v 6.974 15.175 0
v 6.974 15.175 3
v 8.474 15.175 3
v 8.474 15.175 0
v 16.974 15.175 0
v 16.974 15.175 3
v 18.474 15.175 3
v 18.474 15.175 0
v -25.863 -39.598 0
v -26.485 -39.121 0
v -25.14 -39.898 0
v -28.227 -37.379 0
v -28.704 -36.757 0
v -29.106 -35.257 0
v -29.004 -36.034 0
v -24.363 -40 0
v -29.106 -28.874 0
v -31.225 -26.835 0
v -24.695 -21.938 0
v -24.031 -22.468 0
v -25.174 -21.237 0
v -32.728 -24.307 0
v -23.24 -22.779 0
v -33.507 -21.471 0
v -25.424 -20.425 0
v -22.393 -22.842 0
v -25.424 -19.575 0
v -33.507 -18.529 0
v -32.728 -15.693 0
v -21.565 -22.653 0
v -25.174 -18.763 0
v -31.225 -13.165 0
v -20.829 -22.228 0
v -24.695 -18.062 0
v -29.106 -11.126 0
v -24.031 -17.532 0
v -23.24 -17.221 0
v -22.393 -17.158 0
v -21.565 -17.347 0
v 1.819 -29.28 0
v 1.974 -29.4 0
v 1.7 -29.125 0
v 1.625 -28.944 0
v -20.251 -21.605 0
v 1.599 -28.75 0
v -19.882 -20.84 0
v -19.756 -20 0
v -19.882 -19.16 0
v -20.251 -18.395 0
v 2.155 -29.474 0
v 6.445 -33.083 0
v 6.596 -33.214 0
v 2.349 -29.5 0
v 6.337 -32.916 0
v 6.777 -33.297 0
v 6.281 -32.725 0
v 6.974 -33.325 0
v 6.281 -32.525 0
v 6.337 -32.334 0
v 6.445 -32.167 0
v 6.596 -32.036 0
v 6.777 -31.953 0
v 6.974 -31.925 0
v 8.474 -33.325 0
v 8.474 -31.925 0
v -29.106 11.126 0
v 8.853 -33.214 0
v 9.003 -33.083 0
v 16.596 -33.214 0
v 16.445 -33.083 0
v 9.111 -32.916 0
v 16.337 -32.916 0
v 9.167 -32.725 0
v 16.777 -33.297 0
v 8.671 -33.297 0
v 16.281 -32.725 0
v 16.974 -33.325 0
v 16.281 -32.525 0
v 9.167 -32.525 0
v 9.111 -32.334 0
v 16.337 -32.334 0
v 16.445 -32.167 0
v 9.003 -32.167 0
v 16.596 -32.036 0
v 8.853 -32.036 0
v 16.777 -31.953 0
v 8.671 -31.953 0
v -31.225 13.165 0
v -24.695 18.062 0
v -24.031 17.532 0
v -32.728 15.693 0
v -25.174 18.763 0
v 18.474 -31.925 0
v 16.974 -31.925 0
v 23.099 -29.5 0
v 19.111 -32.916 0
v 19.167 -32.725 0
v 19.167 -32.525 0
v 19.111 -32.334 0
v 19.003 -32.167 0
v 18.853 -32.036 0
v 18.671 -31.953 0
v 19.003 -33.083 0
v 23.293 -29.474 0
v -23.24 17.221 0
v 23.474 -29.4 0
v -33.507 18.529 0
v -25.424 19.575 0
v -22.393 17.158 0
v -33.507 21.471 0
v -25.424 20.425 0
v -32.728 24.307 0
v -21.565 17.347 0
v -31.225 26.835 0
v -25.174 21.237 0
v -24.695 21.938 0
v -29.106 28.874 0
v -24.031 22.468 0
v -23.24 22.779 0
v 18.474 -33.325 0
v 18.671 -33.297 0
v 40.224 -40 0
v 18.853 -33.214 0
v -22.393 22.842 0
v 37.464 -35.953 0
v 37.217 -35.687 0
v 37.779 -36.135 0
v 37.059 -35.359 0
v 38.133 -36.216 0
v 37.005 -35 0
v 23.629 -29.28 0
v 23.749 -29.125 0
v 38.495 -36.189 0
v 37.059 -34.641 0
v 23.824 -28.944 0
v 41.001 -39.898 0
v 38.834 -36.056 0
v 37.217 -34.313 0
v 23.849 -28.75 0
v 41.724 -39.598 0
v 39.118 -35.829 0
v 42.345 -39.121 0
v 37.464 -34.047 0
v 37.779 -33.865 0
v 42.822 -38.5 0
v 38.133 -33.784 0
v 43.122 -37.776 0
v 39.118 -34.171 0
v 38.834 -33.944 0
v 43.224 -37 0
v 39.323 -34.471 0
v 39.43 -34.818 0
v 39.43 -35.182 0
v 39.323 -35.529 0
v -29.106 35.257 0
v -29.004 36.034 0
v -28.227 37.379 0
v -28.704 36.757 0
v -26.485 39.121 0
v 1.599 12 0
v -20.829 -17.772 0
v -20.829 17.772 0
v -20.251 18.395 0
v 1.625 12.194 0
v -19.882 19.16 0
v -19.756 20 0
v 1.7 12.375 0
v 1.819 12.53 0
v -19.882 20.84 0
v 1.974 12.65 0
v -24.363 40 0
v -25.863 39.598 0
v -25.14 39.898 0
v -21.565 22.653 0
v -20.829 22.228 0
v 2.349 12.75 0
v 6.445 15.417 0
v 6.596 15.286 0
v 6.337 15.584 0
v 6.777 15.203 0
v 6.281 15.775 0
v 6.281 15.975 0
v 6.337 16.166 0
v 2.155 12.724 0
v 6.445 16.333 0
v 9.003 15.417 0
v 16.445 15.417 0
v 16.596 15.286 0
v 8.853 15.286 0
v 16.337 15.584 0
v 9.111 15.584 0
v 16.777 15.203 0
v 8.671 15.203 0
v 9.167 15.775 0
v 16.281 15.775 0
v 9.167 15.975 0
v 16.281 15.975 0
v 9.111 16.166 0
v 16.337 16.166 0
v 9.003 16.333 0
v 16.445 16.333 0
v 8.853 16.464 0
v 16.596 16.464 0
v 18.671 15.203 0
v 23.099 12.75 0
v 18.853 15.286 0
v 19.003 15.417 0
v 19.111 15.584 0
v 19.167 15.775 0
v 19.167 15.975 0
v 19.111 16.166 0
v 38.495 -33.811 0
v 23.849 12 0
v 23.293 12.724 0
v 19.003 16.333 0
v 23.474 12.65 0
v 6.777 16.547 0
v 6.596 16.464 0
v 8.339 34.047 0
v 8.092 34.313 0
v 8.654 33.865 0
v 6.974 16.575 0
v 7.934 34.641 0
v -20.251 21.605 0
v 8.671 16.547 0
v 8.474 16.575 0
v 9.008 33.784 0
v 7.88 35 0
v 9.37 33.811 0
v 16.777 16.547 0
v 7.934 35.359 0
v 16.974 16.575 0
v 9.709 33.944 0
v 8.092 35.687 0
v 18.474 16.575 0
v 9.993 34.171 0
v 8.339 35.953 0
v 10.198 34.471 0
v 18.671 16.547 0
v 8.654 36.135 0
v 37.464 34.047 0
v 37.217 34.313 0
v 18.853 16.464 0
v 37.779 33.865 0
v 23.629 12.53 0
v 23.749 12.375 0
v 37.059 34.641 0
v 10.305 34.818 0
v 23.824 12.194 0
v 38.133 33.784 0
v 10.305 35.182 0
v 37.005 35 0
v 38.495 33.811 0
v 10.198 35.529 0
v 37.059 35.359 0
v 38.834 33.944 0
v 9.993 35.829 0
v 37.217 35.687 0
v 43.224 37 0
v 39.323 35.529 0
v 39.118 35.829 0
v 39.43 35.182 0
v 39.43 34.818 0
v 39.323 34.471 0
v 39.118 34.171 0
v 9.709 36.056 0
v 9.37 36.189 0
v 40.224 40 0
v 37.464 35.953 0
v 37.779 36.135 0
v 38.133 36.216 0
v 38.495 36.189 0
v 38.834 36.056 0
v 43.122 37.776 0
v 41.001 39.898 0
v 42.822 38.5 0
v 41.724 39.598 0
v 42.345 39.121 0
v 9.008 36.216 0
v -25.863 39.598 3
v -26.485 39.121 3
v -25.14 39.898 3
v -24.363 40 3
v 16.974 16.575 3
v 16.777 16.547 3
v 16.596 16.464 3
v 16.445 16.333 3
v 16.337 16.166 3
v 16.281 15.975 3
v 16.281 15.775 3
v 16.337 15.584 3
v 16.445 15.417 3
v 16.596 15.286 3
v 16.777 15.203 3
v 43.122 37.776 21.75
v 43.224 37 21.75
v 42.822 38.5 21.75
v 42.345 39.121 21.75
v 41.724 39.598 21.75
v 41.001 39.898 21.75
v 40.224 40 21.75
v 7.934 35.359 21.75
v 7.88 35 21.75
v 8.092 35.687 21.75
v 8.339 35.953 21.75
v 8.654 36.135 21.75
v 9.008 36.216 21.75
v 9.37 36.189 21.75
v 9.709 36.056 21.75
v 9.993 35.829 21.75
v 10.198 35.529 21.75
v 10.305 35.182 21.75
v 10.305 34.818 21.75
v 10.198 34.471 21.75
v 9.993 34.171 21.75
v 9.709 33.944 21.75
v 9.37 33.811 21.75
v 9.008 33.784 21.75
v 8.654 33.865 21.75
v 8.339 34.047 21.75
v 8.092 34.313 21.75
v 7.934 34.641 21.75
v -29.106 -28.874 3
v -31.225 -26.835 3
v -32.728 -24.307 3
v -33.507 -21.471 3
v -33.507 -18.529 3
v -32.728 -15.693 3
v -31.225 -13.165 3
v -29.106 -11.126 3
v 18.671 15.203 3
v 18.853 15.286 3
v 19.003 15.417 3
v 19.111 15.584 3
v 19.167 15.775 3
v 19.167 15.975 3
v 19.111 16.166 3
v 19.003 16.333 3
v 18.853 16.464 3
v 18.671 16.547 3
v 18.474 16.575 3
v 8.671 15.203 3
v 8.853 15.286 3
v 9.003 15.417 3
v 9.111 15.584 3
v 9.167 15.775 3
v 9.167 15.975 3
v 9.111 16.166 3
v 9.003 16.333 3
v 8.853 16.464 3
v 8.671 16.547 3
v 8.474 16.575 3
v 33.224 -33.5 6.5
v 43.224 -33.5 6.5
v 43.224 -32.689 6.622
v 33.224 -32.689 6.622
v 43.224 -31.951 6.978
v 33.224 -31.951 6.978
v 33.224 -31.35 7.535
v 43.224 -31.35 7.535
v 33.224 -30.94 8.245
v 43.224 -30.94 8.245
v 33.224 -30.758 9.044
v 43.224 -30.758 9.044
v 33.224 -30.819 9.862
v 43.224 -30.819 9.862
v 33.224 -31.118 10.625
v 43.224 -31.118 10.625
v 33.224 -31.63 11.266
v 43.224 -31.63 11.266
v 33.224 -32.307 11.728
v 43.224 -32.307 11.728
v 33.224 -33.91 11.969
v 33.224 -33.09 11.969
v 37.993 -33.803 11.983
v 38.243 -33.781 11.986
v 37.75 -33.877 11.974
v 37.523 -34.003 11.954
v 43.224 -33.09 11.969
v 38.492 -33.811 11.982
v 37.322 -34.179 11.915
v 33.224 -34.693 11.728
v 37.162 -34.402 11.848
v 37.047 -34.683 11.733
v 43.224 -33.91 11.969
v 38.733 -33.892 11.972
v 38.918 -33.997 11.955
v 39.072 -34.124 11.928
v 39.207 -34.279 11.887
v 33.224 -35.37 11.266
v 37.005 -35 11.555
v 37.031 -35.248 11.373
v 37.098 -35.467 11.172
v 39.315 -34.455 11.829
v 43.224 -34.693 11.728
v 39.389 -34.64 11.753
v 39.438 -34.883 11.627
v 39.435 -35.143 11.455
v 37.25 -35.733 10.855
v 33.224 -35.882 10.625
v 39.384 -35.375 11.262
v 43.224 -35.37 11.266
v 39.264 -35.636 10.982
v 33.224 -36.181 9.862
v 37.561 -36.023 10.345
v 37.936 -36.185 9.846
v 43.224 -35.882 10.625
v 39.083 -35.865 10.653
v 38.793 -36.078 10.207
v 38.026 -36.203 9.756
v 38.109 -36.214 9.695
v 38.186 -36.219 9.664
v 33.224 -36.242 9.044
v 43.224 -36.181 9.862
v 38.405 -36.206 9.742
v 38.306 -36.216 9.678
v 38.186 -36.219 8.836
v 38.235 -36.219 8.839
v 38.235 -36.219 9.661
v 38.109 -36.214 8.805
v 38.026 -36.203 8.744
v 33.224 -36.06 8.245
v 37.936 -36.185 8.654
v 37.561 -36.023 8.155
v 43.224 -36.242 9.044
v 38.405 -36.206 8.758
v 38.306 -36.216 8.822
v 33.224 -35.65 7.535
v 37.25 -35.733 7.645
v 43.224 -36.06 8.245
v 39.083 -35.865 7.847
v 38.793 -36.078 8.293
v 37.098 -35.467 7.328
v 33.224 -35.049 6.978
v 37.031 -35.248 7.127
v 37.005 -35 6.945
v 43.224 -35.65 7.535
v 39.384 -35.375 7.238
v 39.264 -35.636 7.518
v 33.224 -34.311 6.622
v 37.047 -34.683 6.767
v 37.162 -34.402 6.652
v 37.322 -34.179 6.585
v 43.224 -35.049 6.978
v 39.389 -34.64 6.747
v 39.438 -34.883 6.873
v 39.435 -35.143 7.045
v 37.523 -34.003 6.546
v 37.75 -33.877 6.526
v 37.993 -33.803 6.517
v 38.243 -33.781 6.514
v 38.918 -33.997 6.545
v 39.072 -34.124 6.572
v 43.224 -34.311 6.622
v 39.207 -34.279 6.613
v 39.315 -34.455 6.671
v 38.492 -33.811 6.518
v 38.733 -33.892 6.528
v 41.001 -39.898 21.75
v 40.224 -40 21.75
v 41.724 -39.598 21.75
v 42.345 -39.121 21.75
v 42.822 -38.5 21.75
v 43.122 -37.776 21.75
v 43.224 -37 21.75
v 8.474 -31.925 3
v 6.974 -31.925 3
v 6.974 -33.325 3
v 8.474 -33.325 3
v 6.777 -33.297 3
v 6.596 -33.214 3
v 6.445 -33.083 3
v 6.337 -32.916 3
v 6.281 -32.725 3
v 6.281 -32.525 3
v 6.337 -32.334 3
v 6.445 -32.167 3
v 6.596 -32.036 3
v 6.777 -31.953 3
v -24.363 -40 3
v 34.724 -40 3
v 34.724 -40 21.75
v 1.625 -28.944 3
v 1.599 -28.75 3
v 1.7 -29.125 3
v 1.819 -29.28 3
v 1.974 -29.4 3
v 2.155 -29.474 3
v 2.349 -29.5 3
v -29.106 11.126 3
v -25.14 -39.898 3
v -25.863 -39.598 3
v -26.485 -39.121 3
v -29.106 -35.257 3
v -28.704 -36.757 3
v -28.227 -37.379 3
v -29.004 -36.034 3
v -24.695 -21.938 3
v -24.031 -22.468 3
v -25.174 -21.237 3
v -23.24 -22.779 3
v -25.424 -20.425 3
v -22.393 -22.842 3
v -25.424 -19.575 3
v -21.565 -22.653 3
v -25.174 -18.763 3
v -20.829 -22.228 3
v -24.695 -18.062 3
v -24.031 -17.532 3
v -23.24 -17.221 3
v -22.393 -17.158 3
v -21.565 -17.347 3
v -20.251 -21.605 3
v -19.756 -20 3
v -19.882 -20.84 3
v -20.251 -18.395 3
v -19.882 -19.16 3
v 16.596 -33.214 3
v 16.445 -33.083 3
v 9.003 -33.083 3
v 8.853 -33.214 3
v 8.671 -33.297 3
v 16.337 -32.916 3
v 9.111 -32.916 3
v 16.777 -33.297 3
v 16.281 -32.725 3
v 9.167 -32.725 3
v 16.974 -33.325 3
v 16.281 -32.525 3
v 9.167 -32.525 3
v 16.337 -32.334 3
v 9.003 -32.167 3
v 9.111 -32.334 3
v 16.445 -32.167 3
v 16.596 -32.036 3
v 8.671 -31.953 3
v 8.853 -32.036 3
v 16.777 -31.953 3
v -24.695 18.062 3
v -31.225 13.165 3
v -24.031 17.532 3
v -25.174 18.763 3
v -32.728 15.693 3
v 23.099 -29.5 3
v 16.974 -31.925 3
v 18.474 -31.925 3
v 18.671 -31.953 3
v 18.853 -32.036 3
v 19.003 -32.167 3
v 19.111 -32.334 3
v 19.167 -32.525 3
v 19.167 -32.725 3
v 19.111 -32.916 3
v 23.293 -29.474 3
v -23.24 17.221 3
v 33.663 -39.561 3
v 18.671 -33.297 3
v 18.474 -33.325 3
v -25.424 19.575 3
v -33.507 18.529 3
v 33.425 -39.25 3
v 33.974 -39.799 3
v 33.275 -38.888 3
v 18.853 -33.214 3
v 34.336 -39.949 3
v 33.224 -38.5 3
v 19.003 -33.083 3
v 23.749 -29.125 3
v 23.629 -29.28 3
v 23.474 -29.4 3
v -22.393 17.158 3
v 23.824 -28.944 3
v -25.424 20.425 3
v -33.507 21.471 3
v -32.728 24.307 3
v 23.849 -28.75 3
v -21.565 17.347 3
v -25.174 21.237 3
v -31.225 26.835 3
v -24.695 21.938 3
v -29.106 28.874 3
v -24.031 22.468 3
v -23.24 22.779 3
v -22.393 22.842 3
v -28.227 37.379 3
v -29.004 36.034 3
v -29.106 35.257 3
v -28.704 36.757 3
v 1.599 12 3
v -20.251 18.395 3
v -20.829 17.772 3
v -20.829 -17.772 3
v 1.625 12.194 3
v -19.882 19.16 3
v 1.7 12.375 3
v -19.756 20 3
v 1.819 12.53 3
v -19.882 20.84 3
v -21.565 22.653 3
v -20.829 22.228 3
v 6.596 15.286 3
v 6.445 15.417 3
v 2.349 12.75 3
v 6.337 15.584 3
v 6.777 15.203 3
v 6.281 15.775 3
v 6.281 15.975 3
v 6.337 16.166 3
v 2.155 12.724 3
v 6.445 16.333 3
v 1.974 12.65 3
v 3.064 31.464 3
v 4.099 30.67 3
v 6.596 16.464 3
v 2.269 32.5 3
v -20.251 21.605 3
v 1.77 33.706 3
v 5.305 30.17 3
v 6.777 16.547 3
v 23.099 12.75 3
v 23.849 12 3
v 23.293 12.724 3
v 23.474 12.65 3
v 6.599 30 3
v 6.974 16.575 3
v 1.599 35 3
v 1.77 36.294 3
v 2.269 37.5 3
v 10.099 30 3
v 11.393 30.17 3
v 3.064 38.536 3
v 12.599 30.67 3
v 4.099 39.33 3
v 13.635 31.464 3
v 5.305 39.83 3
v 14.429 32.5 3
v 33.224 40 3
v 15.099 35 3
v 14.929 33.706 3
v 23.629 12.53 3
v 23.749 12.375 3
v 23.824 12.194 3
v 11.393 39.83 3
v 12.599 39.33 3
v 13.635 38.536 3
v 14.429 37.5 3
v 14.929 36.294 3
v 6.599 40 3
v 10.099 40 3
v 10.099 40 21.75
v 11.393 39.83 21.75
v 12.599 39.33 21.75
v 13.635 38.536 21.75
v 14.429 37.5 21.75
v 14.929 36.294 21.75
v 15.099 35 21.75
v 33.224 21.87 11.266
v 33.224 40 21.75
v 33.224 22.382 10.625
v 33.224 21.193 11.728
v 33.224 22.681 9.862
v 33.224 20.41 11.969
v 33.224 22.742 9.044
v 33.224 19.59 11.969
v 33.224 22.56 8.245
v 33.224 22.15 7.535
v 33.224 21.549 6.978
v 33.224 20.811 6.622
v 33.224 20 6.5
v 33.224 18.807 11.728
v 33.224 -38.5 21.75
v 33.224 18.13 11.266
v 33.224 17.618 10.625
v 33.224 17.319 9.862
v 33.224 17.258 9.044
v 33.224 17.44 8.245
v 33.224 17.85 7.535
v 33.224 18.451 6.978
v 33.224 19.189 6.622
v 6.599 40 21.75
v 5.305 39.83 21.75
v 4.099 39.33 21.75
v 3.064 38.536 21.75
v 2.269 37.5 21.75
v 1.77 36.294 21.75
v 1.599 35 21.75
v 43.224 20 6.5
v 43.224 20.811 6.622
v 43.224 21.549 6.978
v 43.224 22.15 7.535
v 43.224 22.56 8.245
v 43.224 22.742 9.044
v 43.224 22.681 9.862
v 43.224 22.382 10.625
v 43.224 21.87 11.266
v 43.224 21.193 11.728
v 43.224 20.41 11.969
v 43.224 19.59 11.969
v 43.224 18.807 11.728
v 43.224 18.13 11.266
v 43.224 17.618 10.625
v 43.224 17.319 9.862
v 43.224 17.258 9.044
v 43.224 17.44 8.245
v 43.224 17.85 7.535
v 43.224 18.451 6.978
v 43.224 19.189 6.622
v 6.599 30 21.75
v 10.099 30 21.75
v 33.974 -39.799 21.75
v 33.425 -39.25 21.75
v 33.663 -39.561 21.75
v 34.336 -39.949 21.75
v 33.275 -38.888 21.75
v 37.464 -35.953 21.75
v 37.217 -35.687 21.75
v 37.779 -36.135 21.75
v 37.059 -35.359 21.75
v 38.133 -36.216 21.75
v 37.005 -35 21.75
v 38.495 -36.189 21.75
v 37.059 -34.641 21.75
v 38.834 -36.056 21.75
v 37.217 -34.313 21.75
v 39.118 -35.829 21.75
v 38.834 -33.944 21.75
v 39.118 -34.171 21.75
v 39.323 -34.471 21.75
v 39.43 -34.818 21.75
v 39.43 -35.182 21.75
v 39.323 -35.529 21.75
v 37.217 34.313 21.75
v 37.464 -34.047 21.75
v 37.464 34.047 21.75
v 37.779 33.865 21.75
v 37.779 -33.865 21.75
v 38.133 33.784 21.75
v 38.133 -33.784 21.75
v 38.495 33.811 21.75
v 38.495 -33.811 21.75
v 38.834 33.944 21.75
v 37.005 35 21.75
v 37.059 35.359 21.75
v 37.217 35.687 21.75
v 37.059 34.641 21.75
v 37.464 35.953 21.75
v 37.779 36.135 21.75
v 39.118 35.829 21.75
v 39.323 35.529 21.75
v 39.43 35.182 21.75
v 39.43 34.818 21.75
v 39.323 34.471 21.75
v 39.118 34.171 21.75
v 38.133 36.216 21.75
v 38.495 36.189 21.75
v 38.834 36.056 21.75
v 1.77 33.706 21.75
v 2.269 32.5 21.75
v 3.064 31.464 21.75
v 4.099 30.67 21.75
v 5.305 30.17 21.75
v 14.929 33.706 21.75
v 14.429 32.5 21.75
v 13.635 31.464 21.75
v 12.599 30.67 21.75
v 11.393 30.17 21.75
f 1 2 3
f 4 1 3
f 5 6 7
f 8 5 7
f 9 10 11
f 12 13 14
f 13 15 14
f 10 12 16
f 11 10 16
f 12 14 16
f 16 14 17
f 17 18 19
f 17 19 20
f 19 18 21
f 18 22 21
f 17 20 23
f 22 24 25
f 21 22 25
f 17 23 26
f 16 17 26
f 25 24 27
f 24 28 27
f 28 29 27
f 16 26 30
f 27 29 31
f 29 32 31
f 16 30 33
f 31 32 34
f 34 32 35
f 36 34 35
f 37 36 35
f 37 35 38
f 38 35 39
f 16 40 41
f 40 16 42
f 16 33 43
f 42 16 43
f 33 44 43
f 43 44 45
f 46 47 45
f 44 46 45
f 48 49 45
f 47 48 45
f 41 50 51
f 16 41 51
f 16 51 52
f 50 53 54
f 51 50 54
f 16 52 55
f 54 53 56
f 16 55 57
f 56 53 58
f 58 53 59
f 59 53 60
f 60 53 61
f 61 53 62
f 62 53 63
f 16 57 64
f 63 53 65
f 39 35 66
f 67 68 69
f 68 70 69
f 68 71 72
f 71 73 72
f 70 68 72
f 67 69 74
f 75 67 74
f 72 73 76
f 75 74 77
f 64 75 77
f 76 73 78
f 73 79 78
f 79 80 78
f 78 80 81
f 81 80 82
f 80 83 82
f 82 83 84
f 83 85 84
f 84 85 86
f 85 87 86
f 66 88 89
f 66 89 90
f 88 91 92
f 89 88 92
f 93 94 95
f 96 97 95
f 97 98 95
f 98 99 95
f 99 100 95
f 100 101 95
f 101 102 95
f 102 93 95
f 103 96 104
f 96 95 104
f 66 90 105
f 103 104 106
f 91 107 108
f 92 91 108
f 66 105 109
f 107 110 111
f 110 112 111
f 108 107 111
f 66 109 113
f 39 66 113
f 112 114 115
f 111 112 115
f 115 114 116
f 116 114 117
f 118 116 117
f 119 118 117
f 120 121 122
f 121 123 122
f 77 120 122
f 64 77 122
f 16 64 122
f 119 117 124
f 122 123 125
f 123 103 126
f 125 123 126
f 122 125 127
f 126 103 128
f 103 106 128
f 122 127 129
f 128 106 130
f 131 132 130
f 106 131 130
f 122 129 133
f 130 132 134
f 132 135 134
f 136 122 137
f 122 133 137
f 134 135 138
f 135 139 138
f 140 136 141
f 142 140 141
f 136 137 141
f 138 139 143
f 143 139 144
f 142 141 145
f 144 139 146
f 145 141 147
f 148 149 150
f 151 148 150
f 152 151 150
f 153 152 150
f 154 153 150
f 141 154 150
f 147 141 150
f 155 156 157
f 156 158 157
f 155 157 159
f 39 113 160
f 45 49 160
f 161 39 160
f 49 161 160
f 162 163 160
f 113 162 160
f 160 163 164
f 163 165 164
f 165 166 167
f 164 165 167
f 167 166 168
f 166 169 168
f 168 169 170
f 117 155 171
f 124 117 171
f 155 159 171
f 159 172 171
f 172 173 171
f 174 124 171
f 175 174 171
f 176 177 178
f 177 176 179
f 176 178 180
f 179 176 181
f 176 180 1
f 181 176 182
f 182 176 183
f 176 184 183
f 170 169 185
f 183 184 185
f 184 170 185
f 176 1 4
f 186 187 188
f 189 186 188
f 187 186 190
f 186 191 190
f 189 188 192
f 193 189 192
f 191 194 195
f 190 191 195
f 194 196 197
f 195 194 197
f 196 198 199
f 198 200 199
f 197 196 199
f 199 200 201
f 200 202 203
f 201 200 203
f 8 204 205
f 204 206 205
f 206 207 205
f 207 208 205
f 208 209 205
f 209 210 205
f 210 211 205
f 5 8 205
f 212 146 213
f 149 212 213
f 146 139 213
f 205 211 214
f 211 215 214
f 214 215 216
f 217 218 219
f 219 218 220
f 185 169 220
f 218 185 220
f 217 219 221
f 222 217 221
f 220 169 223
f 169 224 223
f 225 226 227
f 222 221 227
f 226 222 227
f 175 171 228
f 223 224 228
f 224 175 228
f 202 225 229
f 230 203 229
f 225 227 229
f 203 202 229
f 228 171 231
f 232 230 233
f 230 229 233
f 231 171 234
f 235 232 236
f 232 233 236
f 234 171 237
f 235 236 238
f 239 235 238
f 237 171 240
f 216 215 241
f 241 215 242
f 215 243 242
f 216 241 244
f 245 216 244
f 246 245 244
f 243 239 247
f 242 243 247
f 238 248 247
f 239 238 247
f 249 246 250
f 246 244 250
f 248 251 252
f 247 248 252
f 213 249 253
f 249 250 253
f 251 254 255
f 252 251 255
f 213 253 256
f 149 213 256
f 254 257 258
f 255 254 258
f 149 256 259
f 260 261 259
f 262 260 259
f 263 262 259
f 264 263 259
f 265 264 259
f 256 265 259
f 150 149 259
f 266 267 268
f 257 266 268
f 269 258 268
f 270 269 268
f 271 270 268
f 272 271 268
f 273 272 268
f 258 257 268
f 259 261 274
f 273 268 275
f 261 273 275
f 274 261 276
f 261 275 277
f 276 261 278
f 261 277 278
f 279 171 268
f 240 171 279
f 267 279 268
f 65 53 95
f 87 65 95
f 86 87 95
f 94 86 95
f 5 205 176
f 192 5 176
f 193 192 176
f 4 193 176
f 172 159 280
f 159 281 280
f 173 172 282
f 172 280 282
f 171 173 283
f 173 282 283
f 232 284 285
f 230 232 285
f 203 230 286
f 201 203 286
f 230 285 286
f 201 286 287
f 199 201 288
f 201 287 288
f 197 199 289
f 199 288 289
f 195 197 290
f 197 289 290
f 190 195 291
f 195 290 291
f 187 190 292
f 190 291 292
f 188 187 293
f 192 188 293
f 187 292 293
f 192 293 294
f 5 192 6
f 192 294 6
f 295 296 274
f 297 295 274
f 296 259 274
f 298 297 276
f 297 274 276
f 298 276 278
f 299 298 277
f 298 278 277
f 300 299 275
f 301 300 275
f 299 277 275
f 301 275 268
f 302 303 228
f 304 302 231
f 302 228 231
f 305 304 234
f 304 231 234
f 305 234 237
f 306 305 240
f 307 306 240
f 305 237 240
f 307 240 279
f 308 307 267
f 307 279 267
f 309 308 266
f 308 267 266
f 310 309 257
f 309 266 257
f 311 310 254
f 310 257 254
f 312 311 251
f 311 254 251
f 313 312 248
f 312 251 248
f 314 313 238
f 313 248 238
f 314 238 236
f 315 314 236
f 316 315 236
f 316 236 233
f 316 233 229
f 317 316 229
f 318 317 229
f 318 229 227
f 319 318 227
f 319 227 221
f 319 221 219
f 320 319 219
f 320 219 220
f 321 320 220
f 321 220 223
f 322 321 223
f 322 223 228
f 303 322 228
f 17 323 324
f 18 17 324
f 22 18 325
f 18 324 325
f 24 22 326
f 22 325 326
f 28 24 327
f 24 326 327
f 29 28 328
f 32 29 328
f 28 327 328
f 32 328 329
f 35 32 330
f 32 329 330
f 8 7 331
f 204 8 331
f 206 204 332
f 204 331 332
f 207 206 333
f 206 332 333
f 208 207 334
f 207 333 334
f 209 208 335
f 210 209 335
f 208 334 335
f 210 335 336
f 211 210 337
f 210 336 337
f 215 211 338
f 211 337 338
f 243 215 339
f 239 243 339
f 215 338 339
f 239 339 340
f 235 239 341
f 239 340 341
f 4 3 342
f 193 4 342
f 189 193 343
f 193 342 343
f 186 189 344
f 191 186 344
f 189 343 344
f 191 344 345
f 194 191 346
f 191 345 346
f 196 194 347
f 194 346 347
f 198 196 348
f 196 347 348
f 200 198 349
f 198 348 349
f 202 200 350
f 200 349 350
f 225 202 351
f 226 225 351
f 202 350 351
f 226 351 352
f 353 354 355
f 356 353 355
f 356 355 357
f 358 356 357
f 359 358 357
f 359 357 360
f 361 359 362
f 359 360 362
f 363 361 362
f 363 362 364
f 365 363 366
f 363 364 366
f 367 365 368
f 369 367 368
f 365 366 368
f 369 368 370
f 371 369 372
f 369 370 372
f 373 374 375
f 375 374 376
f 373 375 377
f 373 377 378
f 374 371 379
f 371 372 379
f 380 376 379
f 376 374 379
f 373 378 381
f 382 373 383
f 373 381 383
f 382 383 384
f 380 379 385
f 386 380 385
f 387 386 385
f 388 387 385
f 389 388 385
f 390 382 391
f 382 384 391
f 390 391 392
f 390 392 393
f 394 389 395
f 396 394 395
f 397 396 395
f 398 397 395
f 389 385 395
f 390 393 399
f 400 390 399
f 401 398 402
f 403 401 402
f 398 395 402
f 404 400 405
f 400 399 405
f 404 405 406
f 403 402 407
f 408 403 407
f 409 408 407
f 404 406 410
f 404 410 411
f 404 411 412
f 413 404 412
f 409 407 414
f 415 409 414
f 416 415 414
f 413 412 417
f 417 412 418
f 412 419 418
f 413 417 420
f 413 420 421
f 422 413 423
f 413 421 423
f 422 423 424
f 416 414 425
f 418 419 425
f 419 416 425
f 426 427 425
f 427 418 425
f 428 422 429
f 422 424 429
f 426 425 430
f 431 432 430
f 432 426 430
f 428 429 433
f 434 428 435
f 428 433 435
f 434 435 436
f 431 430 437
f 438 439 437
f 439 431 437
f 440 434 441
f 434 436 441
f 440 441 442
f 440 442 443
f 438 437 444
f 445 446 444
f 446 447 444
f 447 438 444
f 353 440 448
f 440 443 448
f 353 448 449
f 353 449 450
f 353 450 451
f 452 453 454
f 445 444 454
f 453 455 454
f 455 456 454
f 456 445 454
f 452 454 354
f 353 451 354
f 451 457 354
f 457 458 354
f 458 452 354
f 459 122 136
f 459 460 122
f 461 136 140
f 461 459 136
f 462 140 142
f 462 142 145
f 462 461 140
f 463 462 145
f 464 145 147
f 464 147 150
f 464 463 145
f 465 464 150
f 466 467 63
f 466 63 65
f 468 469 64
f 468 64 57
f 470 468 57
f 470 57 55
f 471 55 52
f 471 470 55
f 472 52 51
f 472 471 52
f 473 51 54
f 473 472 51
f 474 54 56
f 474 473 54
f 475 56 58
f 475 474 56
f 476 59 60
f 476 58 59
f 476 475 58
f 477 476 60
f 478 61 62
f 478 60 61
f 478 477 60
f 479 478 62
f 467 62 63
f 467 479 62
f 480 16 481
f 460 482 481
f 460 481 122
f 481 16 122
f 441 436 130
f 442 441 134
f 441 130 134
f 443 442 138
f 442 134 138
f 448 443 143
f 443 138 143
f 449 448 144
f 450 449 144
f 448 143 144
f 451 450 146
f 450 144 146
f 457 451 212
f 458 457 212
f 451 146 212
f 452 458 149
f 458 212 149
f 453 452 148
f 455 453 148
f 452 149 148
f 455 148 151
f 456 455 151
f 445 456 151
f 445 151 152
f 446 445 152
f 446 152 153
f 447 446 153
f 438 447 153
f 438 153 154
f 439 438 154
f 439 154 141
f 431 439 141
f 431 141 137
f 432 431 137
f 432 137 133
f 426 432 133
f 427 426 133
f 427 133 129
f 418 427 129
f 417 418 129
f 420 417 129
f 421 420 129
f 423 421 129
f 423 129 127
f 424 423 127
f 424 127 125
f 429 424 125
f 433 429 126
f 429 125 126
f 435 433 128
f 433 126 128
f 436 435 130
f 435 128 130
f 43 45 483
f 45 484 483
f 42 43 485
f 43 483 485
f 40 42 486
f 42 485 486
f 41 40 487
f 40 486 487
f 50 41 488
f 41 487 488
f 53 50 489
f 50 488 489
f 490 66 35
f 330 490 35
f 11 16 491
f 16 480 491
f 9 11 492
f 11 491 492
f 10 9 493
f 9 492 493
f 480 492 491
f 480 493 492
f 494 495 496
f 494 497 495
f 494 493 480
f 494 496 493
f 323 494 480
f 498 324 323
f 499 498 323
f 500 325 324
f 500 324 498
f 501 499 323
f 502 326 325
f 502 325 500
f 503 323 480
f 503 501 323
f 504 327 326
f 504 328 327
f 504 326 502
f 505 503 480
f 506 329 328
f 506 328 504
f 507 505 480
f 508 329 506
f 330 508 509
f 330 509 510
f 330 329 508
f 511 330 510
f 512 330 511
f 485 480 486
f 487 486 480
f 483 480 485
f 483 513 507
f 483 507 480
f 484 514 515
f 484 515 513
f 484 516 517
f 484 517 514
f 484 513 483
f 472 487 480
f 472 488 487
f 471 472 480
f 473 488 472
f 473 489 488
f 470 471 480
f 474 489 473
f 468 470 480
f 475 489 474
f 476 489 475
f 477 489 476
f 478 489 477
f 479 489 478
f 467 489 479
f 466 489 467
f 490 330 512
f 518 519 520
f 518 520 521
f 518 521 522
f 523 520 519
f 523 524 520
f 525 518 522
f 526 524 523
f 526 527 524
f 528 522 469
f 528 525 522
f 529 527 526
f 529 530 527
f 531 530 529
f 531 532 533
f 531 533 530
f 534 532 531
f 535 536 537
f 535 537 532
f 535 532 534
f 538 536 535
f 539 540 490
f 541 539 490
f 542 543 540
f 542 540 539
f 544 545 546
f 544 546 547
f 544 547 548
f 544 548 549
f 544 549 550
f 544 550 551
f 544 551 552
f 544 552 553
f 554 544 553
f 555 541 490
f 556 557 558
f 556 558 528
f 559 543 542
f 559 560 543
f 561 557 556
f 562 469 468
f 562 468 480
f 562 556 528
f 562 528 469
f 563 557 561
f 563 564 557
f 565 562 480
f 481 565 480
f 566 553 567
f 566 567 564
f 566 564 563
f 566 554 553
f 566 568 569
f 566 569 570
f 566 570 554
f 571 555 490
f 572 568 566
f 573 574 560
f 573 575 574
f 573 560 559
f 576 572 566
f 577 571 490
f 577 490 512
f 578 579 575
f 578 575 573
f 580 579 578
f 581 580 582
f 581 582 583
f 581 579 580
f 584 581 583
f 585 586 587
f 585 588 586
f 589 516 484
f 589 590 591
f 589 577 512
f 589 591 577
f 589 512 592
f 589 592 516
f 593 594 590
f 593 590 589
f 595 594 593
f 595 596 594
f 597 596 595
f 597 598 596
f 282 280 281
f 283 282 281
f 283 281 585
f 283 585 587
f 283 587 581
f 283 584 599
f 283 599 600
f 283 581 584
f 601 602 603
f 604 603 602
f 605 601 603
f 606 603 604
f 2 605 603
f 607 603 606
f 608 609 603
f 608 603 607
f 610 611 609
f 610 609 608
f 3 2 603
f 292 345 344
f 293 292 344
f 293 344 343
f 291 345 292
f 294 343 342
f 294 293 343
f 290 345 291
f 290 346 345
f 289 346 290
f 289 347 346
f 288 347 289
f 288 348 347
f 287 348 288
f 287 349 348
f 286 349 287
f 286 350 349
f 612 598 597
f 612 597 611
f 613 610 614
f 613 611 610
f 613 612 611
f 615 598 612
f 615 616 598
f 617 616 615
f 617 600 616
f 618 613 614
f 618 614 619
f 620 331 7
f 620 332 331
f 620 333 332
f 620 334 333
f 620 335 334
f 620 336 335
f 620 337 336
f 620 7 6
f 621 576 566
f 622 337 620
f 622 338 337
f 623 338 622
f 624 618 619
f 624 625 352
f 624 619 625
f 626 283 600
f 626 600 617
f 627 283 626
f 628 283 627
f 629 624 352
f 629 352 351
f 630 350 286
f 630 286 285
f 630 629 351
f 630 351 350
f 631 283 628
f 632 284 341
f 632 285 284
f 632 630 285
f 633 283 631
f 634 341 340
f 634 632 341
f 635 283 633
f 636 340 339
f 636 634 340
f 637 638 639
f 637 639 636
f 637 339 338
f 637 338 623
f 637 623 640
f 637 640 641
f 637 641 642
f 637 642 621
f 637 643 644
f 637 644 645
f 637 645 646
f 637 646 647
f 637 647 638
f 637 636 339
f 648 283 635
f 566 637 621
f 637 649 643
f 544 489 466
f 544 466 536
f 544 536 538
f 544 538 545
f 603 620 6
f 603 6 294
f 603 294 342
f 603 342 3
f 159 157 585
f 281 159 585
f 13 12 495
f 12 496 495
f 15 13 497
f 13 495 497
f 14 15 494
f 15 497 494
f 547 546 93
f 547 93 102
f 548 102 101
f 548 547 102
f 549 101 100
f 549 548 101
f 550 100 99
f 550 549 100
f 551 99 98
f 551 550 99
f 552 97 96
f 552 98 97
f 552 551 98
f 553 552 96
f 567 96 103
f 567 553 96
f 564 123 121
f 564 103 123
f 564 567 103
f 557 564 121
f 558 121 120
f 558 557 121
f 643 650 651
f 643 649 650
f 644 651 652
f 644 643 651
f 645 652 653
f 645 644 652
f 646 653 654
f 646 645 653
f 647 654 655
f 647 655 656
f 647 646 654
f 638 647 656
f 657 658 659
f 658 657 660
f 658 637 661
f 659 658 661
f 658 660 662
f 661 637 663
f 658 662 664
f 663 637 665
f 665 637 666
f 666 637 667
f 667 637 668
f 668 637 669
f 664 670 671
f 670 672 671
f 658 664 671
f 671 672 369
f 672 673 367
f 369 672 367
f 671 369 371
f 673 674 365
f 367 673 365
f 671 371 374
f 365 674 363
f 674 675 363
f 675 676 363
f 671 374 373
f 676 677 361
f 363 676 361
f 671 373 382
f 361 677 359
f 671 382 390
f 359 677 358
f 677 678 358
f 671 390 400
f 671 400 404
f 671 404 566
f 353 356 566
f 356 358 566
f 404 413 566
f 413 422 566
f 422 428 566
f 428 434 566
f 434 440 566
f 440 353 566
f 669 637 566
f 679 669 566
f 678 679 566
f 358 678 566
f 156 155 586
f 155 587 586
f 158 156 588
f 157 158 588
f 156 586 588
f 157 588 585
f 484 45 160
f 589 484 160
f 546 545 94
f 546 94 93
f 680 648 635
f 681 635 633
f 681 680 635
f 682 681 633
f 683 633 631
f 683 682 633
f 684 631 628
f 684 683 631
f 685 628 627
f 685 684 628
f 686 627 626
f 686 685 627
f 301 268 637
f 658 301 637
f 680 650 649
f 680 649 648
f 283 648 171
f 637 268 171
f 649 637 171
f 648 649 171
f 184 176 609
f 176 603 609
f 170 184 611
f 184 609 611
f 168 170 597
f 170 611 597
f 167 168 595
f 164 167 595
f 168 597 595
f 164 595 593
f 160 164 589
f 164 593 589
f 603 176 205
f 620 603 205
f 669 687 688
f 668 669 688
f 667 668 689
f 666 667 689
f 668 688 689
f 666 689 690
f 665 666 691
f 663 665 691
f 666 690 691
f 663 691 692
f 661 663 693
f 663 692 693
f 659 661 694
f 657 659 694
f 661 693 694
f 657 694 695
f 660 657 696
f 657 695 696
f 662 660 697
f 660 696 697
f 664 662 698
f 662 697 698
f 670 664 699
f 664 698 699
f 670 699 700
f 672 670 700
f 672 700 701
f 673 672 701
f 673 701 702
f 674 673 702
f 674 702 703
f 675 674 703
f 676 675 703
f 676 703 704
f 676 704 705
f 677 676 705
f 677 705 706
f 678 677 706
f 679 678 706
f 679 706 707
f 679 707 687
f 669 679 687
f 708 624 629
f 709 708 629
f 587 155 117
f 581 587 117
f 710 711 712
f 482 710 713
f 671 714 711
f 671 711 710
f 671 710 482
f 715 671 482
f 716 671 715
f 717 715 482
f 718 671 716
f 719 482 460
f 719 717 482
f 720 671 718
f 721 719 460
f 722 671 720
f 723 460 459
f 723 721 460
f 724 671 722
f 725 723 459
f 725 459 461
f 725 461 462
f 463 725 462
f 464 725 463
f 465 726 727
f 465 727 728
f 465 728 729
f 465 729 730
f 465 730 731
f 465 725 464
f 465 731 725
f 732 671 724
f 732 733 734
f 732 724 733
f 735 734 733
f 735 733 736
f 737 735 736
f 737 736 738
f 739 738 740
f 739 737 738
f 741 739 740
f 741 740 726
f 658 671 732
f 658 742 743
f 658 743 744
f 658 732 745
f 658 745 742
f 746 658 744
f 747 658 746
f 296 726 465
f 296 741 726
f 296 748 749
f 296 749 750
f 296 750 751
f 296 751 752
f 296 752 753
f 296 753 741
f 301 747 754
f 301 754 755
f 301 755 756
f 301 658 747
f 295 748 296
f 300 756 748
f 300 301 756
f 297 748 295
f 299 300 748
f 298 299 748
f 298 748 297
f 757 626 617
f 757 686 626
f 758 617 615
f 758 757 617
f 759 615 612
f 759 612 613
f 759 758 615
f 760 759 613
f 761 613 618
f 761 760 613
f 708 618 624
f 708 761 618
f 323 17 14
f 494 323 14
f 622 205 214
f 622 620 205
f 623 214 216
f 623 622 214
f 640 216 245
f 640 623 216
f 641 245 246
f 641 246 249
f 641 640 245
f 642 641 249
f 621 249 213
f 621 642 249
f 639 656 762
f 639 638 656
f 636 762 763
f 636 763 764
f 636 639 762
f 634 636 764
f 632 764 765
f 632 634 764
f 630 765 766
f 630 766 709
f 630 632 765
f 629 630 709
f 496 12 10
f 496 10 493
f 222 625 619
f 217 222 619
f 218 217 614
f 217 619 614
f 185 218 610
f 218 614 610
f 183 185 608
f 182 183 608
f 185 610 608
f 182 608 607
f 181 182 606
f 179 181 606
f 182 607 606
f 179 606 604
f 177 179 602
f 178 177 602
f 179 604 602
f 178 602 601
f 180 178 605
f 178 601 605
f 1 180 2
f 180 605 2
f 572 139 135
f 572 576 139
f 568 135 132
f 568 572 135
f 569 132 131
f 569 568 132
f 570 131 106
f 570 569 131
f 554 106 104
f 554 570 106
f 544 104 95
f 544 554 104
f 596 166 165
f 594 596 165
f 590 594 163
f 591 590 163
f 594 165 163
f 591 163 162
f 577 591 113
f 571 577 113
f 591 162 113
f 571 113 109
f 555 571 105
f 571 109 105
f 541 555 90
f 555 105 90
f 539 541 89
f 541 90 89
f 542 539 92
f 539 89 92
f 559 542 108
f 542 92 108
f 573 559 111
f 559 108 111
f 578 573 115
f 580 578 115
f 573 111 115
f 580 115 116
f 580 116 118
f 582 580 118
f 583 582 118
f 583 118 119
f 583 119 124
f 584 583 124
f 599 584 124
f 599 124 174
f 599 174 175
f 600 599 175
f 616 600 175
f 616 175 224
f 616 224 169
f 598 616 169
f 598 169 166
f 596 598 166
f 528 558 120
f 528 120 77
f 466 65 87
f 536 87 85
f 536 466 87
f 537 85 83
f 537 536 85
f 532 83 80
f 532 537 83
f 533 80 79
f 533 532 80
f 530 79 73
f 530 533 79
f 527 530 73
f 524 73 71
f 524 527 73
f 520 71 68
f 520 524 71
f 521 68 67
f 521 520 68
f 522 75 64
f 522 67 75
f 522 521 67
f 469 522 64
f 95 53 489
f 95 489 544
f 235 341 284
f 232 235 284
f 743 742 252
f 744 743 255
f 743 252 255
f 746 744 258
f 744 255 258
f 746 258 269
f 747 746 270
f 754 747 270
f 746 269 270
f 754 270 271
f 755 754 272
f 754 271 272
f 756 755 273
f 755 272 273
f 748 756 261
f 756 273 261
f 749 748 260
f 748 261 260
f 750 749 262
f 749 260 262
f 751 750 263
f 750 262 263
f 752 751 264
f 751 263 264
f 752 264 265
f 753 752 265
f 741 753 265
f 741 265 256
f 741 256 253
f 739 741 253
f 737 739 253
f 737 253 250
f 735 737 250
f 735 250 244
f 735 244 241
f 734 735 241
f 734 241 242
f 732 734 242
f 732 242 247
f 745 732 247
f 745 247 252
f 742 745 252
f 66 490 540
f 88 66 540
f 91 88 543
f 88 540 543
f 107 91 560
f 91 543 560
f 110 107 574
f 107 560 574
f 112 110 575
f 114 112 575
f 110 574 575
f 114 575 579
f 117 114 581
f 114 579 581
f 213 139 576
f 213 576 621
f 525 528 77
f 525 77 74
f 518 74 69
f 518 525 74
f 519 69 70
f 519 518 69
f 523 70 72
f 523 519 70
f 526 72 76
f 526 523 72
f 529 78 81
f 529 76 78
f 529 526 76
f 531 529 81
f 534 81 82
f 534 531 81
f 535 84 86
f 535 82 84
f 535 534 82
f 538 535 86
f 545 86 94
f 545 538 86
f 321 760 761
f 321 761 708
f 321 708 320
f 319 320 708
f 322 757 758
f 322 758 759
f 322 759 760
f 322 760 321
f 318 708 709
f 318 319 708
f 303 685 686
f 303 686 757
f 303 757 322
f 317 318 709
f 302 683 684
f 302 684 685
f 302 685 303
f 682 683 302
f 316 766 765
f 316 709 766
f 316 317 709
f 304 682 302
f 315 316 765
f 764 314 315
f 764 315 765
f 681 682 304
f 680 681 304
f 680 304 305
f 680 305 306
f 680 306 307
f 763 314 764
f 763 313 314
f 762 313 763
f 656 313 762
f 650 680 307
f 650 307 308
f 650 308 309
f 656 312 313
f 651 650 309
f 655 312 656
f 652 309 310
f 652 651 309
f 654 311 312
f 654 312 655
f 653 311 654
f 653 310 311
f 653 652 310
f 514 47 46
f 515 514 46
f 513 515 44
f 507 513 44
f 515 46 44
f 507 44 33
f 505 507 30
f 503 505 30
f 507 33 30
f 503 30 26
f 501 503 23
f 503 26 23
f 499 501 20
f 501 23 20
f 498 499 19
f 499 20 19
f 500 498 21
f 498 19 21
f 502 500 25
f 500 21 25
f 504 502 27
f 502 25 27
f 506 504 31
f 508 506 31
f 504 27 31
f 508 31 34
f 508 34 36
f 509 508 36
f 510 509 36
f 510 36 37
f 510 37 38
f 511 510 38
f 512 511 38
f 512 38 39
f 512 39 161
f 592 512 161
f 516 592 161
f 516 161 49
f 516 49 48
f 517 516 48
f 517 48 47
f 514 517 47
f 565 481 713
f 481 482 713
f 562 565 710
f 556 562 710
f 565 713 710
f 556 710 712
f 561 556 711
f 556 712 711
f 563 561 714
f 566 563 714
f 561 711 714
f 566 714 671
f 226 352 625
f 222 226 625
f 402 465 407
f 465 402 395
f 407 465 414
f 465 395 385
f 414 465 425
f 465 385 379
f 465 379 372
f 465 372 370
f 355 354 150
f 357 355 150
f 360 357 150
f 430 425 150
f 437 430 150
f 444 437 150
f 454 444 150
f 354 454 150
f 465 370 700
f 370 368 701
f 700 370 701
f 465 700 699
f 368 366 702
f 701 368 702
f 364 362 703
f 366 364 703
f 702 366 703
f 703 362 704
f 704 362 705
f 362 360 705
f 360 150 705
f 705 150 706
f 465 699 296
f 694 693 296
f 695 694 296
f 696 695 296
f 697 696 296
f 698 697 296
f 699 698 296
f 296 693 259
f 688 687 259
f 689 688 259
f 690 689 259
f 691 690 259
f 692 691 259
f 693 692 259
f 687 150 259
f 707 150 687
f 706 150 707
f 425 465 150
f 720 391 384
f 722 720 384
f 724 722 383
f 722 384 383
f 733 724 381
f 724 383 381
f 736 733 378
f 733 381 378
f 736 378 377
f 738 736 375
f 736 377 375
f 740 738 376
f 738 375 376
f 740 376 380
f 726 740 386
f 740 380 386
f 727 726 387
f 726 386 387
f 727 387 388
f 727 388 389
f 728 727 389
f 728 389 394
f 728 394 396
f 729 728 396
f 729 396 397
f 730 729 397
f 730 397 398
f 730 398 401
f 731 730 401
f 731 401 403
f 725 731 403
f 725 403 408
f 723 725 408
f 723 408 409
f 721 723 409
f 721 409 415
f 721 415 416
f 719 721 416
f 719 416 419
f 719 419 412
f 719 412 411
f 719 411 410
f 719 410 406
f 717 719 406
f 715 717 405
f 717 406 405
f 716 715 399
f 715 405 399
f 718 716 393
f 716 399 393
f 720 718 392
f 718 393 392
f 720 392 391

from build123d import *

# Parameters (mm, degrees)
BASE_W                 = 22.25
BASE_H                 = 42.25
MAIN_DEPTH             = 3
GEAR_AXIS_HOLES_D      = 5.7
M1_6_CLEARANCE_HOLE1_D = 1.4
BOSS_EXTRUDE1_DEPTH    = 18.75
FILLET2_R              = 0.75
FILLET4_R              = 5
FILLET8_R              = 1.5
BOSS_EXTRUDE2_DEPTH    = 3
CHAMFER1_SIZE          = 3.5
FILLET6_R              = 3
CUT_EXTRUDE1_DEPTH     = 62.805259158
F_2_CLEARANCE_HOLE1_D  = 2.4384
M5_CLEARANCE_HOLE1_D   = 5.5
SKETCH20_W             = 18.125
SKETCH20_H             = 15
CUT_EXTRUDE2_DEPTH     = 18.75
FILLET7_R              = 5


with BuildPart() as part:
    # Base → Main (new body)
    with BuildSketch(Plane.XY):
        Polygon((-29.105845183, 40), (-29.105845183, -40), (-17.775845183, -40), (43.224154817, -40), (43.224154817, 40), align=None)
        with Locations((12.724154817, -8.375)):
            Rectangle(BASE_W, BASE_H, mode=Mode.SUBTRACT)
    extrude(amount=MAIN_DEPTH)

    # Gear Axis Holes (through all)
    with Locations(Plane(origin=(0, 0, 3), x_dir=(-1, 0, 0), z_dir=(0, 0, 1))):
        with Locations((22.605845183, 20), (22.605845183, -20)):
            Hole(GEAR_AXIS_HOLES_D / 2)

    # M1.6 Clearance Hole1 (through all)
    with Locations(Plane.XY.offset(3)):
        with Locations((17.724154817, -32.625), (7.724154817, -32.625), (7.724154817, 15.875), (17.724154817, 15.875)):
            Hole(M1_6_CLEARANCE_HOLE1_D / 2)

    # Sketch13 → Boss-Extrude1 (add)
    with BuildSketch(Plane.XY.offset(3)):
        Polygon((1.599154817, 30), (33.224154817, 30), (33.224154817, 1), (33.224154817, -30), (33.224154817, -40), (43.224154817, -40), (43.224154817, 1), (43.224154817, 40), (1.599154817, 40), align=None)
    extrude(amount=BOSS_EXTRUDE1_DEPTH)

    # Fillet2
    fillet2_edges = [part.edges().sort_by_distance(p)[0] for p in [
        (1.599154817, -29.5, 1.5),
        (23.849154817, -29.5, 1.5),
        (23.849154817, 12.75, 1.5),
        (1.599154817, 12.75, 1.5),
    ]]
    fillet(fillet2_edges, radius=FILLET2_R)

    # Fillet4
    fillet4_edges = [part.edges().sort_by_distance(p)[0] for p in [
        (1.599154817, 40, 12.375),
        (1.599154817, 30, 12.375),
        (33.224154817, 30, 12.375),
    ]]
    fillet(fillet4_edges, radius=FILLET4_R - 0.0001)  # a hair under: the kernel refuses the full size

    # Fillet8
    fillet8_edges = [part.edges().sort_by_distance(p)[0] for p in [
        (33.224154817, -40, 12.375),
    ]]
    fillet(fillet8_edges, radius=FILLET8_R)

    # Sketch21 → Boss-Extrude2 (add)
    with BuildSketch(Plane.XY.offset(3)):
        with BuildLine():
            Line((-29.105845183, 28.874119675), (-29.105845183, 11.125880325))
            ThreePointArc((-29.105845183, 11.125880325), (-33.605845183, 20), (-29.105845183, 28.874119675))
        make_face()
        with BuildLine():
            Line((-29.105845183, -11.125880325), (-29.105845183, -28.874119675))
            ThreePointArc((-29.105845183, -28.874119675), (-33.605845183, -20), (-29.105845183, -11.125880325))
        make_face()
    extrude(amount=-BOSS_EXTRUDE2_DEPTH)

    # Chamfer1
    chamfer1_edges = [part.edges().sort_by_distance(p)[0] for p in [
        (-29.105845183, -40, 1.5),
        (-29.105845183, 40, 1.5),
    ]]
    chamfer(chamfer1_edges, length=CHAMFER1_SIZE)

    # Fillet6
    fillet6_edges = [part.edges().sort_by_distance(p)[0] for p in [
        (-25.605845183, -40, 1.5),
        (-29.105845183, -36.5, 1.5),
        (-29.105845183, 36.5, 1.5),
        (-25.605845183, 40, 1.5),
        (43.224154817, 40, 10.875),
        (43.224154817, -40, 10.875),
    ]]
    fillet(fillet6_edges, radius=FILLET6_R)

    # Sketch14 → Cut-Extrude1 (cut, through all)
    with BuildSketch(Plane.XY.offset(3)):
        with BuildLine():
            Line((8.474154817, -33.325), (6.974154817, -33.325))
            ThreePointArc((6.974154817, -33.325), (6.274154817, -32.625), (6.974154817, -31.925))
            Line((6.974154817, -31.925), (8.474154817, -31.925))
            ThreePointArc((8.474154817, -31.925), (9.174154817, -32.625), (8.474154817, -33.325))
        make_face()
        with BuildLine():
            Line((18.474154817, -33.325), (16.974154817, -33.325))
            ThreePointArc((16.974154817, -33.325), (16.274154817, -32.625), (16.974154817, -31.925))
            Line((16.974154817, -31.925), (18.474154817, -31.925))
            ThreePointArc((18.474154817, -31.925), (19.174154817, -32.625), (18.474154817, -33.325))
        make_face()
        with BuildLine():
            Line((8.474154817, 16.575), (6.974154817, 16.575))
            ThreePointArc((6.974154817, 16.575), (6.274154817, 15.875), (6.974154817, 15.175))
            Line((6.974154817, 15.175), (8.474154817, 15.175))
            ThreePointArc((8.474154817, 15.175), (9.174154817, 15.875), (8.474154817, 16.575))
        make_face()
        with BuildLine():
            Line((18.474154817, 16.575), (16.974154817, 16.575))
            ThreePointArc((16.974154817, 16.575), (16.274154817, 15.875), (16.974154817, 15.175))
            Line((16.974154817, 15.175), (18.474154817, 15.175))
            ThreePointArc((18.474154817, 15.175), (19.174154817, 15.875), (18.474154817, 16.575))
        make_face()
    extrude(amount=-CUT_EXTRUDE1_DEPTH, mode=Mode.SUBTRACT)

    # #2 Clearance Hole1 (through all)
    with Locations(Plane.XY.offset(21.75)):
        with Locations((9.099154817, 35), (38.224154817, 35), (38.224154817, -35)):
            Hole(F_2_CLEARANCE_HOLE1_D / 2)

    # M5 Clearance Hole1 (through all)
    with Locations(Plane.ZY.offset(-33.224154817)):
        with Locations((9.25, 20), (9.25, -33.5)):
            Hole(M5_CLEARANCE_HOLE1_D / 2)

    # Sketch20 → Cut-Extrude2 (cut)
    with BuildSketch(Plane.XY.offset(21.75)):
        with Locations((24.161654817, 32.5)):
            Rectangle(SKETCH20_W, SKETCH20_H)
    extrude(amount=-CUT_EXTRUDE2_DEPTH, mode=Mode.SUBTRACT)

    # Fillet7
    fillet7_edges = [part.edges().sort_by_distance(p)[0] for p in [
        (15.099154817, 40, 12.375),
        (15.099154817, 30, 12.375),
    ]]
    fillet(fillet7_edges, radius=FILLET7_R - 0.0001)  # a hair under: the kernel refuses the full size


solid = part.part
